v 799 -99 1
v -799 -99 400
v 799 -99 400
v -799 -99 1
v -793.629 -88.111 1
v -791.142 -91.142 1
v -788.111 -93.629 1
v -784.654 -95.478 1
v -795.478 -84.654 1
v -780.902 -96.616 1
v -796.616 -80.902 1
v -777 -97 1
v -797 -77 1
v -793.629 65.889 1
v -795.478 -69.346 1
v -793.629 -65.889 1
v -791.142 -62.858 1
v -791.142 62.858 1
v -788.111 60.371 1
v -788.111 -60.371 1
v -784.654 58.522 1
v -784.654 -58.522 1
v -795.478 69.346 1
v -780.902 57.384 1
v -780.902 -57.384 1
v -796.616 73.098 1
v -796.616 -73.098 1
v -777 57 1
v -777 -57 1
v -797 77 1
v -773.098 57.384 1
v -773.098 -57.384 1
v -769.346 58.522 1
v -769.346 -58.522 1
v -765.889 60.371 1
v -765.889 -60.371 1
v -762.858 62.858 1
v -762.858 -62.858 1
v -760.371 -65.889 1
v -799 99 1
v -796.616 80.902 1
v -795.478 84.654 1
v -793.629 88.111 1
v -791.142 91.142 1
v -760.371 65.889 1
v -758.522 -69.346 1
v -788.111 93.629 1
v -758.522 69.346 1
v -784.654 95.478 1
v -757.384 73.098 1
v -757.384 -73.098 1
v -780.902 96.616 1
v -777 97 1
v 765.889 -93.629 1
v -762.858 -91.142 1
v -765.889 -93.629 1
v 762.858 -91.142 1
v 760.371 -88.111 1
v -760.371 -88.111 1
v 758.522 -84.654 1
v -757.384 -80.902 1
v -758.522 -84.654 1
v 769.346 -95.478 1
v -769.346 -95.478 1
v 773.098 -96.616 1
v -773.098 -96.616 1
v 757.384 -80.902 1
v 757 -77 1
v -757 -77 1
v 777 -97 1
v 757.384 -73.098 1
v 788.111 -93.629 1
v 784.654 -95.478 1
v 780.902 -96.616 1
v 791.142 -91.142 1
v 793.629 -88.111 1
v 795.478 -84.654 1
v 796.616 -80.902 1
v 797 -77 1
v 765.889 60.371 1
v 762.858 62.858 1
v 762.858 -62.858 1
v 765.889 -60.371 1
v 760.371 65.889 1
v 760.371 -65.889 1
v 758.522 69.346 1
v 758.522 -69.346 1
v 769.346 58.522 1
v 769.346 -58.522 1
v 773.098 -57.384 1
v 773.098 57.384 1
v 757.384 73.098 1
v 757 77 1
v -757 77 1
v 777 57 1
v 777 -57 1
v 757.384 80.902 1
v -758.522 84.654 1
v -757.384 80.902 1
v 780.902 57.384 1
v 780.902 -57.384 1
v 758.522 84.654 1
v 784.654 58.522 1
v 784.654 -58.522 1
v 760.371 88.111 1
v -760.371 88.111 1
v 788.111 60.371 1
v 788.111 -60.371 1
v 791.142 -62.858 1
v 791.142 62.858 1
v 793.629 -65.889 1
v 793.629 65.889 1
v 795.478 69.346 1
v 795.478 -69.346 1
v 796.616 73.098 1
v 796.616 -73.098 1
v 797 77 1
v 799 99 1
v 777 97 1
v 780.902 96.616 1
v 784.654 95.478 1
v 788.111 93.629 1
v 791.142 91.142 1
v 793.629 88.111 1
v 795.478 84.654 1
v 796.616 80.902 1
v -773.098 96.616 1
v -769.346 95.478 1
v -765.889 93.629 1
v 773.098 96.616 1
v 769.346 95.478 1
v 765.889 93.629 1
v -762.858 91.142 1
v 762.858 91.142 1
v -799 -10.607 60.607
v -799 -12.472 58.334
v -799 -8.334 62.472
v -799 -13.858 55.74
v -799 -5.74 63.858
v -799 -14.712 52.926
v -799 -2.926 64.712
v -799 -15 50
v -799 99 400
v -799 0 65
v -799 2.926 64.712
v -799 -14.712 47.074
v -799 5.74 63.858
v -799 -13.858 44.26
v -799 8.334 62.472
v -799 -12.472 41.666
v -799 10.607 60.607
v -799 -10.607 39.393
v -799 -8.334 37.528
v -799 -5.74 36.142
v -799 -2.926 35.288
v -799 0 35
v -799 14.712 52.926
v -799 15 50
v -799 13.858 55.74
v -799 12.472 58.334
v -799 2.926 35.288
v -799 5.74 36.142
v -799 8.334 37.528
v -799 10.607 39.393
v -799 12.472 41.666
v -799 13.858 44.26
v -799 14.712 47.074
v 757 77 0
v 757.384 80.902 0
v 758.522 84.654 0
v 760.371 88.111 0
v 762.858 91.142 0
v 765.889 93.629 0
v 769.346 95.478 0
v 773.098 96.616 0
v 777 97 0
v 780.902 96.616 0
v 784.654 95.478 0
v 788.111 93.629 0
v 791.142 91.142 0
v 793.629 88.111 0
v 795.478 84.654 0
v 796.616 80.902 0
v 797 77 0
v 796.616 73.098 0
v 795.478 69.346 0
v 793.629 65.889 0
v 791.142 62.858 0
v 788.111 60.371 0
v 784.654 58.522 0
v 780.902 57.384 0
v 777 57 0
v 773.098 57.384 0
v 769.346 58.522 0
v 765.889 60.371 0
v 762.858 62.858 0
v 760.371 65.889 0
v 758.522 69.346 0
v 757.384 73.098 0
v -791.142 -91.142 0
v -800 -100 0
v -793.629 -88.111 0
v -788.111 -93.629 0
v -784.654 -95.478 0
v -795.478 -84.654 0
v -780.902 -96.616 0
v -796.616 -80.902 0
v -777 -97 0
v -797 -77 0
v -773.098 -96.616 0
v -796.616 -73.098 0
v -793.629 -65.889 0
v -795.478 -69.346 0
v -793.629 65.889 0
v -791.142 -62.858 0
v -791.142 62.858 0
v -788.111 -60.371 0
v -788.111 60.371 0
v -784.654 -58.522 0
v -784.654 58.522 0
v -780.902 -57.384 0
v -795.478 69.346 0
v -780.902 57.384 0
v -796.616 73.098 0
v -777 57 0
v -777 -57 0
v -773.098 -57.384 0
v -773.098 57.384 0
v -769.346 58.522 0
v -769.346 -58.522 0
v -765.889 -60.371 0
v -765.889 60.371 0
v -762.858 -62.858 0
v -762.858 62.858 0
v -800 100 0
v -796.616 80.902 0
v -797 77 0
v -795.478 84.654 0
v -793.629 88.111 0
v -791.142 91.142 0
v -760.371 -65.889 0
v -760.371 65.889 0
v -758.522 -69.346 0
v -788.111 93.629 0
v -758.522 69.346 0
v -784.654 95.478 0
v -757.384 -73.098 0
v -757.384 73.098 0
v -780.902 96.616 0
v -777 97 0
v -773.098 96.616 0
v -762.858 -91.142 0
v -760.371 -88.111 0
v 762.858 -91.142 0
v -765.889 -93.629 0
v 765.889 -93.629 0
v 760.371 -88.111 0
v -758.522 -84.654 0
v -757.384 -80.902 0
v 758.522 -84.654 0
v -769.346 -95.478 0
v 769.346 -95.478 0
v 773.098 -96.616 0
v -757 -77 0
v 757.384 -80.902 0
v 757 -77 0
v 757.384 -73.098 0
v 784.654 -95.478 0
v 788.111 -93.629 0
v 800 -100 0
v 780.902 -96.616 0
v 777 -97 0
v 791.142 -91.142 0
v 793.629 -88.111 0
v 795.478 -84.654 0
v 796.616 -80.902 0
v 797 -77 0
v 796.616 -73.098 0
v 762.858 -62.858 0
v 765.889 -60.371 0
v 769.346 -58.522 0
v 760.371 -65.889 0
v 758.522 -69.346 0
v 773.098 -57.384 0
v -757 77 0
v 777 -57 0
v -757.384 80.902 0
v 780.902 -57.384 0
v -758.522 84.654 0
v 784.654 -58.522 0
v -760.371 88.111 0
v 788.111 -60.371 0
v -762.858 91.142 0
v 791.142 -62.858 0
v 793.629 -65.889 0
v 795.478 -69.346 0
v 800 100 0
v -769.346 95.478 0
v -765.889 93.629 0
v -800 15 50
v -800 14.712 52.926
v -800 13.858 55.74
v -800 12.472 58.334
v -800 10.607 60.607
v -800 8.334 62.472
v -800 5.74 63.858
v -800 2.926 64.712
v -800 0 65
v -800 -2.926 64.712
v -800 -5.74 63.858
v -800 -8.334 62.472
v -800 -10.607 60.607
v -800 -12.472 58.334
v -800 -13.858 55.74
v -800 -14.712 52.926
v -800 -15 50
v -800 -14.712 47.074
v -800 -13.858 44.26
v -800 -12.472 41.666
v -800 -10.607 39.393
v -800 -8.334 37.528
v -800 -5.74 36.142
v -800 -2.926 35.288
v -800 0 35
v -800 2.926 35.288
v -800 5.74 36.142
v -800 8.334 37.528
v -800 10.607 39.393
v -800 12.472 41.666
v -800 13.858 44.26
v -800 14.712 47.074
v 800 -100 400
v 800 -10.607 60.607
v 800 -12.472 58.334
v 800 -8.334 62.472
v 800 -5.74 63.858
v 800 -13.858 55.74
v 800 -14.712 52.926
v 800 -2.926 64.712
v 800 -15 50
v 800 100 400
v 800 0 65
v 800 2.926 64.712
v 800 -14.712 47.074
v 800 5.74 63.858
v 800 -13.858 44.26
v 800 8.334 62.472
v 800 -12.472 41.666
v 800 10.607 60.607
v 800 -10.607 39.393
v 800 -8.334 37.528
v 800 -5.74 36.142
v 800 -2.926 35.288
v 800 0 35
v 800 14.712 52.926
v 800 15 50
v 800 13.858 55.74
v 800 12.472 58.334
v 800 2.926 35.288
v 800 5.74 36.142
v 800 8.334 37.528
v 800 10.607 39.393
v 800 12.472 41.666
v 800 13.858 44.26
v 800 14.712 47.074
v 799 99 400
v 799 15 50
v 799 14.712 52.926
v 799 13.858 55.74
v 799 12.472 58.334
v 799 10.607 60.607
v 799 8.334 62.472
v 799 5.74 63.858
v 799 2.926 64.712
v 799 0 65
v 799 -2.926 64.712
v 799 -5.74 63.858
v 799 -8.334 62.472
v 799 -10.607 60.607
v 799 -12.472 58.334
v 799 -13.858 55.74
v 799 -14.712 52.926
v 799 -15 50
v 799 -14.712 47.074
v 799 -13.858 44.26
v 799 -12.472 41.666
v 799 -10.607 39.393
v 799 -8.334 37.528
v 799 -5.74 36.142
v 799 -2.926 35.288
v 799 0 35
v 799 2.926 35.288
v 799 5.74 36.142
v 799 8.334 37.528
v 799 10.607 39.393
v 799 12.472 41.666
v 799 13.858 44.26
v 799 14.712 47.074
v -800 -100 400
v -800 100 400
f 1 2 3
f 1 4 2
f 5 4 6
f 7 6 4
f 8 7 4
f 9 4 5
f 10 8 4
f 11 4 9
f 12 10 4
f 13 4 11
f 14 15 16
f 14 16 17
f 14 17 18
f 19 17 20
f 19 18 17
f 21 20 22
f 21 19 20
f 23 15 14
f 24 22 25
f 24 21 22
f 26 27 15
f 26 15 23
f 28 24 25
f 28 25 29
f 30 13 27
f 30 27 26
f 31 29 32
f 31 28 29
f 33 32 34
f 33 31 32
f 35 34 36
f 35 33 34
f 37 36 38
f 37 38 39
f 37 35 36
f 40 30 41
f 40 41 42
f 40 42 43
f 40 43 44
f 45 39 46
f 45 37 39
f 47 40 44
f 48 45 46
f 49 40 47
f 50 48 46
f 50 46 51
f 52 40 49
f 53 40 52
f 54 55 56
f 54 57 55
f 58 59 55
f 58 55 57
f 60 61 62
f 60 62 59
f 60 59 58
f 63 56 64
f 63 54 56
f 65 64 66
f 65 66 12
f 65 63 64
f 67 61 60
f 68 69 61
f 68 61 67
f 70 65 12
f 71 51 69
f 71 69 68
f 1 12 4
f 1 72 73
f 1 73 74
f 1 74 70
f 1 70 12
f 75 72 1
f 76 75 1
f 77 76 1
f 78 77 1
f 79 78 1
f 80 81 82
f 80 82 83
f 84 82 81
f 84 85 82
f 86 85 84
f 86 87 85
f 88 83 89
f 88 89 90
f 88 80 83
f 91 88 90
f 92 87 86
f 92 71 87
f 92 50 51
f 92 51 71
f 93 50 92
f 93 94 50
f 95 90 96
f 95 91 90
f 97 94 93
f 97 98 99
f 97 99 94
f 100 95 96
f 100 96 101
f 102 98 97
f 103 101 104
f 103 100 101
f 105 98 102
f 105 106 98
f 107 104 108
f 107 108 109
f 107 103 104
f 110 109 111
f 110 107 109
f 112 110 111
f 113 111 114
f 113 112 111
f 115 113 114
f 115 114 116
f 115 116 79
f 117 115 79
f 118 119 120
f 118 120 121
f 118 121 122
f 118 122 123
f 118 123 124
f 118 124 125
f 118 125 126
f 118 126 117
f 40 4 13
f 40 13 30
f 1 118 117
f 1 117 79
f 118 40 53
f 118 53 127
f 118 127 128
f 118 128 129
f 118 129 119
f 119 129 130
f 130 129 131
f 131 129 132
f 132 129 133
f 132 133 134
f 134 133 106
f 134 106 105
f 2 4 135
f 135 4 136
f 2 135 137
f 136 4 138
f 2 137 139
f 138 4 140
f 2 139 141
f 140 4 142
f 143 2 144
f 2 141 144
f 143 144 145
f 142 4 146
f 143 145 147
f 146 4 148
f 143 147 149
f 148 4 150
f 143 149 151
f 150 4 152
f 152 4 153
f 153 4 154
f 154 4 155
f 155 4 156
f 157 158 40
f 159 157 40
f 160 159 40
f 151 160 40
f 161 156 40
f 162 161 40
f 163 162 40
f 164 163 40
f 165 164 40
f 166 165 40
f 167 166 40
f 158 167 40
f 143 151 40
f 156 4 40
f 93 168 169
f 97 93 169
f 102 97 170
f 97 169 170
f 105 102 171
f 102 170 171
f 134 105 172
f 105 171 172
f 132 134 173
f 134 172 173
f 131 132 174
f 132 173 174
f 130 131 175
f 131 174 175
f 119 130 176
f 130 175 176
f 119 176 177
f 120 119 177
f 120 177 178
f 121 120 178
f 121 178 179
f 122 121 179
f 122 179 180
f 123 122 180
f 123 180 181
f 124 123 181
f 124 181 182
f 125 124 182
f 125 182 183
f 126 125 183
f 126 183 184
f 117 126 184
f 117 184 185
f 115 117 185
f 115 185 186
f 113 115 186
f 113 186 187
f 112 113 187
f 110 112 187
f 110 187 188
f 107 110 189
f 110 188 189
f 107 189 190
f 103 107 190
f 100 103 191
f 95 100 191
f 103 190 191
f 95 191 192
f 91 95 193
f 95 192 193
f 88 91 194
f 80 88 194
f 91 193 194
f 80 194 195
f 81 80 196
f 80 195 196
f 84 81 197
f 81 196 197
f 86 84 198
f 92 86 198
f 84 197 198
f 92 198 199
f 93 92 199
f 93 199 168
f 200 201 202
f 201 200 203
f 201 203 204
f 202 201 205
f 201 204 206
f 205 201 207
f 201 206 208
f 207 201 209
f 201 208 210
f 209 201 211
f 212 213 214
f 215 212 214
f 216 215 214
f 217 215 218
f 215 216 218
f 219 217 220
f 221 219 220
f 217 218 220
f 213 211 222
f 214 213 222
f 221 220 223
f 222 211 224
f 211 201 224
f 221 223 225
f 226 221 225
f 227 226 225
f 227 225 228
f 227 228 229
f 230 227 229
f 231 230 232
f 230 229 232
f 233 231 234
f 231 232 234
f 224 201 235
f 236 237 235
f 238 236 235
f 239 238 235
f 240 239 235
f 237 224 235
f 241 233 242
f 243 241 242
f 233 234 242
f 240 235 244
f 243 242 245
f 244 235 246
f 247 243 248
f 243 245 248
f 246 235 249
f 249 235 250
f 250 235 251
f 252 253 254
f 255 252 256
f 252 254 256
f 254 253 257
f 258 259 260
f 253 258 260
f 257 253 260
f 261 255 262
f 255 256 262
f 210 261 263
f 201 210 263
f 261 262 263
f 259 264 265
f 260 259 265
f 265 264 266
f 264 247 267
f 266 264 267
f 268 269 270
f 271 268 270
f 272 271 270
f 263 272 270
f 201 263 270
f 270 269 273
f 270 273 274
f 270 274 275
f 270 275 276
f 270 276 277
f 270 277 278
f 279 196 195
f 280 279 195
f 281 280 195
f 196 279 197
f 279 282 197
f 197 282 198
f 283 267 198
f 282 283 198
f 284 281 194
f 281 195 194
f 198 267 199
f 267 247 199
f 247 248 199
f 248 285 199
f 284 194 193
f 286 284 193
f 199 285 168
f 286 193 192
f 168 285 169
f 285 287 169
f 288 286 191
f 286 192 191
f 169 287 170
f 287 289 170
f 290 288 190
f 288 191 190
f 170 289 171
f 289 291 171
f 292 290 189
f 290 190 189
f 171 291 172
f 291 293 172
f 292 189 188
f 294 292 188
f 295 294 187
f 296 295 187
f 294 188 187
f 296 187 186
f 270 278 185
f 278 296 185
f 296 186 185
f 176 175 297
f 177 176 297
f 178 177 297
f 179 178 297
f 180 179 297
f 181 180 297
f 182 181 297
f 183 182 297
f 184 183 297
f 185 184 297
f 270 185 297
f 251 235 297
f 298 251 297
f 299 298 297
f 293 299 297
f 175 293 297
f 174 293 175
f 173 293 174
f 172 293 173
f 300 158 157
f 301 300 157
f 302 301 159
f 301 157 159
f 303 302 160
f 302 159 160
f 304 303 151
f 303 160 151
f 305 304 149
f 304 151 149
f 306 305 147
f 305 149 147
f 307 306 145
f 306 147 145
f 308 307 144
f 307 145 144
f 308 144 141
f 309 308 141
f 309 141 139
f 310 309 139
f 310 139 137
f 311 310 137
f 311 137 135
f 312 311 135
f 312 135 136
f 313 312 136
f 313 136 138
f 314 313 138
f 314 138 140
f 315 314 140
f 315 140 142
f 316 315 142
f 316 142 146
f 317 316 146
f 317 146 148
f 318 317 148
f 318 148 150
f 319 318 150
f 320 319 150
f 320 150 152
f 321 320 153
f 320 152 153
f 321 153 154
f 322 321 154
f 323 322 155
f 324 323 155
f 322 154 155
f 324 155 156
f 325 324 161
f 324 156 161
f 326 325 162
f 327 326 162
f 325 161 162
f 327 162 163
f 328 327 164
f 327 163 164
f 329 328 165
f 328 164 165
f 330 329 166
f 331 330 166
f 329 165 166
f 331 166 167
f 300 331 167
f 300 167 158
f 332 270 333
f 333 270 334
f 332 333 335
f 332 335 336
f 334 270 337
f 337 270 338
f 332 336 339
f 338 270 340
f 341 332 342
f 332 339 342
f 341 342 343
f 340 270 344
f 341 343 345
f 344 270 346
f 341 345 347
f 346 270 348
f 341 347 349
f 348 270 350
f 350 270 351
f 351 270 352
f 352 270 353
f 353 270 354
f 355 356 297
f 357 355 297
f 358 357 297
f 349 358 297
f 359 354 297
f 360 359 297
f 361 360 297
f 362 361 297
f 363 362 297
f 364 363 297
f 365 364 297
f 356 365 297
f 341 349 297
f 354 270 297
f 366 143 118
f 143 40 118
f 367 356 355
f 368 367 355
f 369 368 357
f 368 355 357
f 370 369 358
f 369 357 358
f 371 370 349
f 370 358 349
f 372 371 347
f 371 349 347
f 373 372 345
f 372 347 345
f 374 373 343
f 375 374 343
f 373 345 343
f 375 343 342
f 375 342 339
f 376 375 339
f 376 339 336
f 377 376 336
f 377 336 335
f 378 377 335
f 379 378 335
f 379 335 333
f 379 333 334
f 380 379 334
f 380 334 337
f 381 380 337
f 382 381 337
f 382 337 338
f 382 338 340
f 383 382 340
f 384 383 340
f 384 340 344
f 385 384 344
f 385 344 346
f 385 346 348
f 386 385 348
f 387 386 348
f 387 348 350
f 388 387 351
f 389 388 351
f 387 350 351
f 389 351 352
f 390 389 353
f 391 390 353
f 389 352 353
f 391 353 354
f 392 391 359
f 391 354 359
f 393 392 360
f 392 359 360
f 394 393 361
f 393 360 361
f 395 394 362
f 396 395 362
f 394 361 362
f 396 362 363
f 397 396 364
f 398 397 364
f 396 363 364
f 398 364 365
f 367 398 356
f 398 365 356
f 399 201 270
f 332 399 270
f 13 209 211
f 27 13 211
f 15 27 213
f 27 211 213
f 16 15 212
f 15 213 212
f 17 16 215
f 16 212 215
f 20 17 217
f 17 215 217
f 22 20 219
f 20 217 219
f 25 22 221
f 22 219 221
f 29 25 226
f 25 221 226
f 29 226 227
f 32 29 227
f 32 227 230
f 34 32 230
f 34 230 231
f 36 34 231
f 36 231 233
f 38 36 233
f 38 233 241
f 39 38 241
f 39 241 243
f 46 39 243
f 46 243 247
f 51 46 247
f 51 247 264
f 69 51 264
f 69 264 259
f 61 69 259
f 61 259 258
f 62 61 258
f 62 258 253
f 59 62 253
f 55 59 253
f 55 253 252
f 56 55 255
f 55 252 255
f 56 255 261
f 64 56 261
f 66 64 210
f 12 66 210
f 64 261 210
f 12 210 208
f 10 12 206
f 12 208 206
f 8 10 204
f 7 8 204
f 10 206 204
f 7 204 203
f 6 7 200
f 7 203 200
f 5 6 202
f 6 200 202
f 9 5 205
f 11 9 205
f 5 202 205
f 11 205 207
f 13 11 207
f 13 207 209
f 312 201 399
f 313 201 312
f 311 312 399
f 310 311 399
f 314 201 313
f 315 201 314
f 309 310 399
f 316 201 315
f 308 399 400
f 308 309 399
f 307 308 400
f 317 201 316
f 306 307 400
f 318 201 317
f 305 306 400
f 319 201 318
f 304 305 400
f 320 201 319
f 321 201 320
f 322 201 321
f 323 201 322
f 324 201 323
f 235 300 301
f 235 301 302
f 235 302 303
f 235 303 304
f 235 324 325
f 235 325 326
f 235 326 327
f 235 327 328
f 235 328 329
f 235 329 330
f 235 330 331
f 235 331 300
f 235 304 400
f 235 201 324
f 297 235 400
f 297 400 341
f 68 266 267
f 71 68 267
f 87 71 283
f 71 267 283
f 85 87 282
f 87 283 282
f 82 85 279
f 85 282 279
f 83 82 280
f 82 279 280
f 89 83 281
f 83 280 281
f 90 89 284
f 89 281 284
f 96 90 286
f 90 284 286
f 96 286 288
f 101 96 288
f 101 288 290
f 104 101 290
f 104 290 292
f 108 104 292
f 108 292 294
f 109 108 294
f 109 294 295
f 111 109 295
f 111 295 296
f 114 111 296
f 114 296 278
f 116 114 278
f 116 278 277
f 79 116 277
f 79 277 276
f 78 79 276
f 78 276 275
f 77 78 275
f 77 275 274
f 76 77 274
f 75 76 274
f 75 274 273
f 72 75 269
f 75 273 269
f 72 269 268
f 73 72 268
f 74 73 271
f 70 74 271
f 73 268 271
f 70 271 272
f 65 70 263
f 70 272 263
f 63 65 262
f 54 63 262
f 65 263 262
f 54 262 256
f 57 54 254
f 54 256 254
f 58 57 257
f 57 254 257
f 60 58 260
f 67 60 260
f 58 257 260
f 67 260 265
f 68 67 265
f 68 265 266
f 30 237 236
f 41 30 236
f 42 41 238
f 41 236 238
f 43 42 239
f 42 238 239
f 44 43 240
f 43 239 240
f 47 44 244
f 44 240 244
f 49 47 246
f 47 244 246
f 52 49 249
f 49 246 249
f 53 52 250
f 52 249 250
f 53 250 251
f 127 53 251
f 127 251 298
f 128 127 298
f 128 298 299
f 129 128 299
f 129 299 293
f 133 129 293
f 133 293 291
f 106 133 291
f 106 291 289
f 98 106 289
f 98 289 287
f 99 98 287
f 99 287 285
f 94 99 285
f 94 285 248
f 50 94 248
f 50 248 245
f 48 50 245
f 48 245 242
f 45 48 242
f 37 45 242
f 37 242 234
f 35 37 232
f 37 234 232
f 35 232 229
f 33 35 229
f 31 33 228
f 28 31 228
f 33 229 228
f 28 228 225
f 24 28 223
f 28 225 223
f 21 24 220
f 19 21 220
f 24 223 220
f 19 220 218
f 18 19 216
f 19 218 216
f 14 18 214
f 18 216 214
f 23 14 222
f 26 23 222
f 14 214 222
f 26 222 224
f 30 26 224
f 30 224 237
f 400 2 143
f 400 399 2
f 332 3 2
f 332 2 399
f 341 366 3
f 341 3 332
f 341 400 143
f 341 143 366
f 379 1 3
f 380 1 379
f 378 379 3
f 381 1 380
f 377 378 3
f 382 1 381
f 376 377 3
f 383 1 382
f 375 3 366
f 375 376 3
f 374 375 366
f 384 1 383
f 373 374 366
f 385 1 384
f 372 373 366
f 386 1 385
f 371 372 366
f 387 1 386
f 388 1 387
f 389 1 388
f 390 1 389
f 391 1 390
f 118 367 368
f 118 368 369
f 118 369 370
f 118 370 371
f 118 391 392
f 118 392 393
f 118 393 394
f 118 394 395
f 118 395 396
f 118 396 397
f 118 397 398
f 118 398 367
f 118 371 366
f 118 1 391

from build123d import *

# Parameters (mm, degrees)
F0_W     = 1600
F0_H     = 200
F1_DEPTH = 400
F2_T     = -1
F5_D     = 40
F8_D     = 30


# Not quite as in the source:
# - the program builds the solid bodies; features that only make, move or delete a surface that nothing else refers to are left out


with BuildPart() as f1:
    # F0 (on Top) → F1 (new body)
    with BuildSketch(Plane.XY):
        Rectangle(F0_W, F0_H)
    extrude(amount=F1_DEPTH)

    # F2
    f2_openings = [f1.faces().sort_by_distance(p)[0] for p in [
        (0, 0, 400),
    ]]
    offset(amount=F2_T, openings=f2_openings)

    # F5 (through all)
    with Locations(Plane.XY.offset(1)):
        with Locations((777, 77), (777, -77), (-777, 77), (-777, -77)):
            Hole(F5_D / 2)

    # F8 (through all)
    with Locations(Plane(origin=(-800, 0, 0), x_dir=(0, -1, 0), z_dir=(-1, 0, 0))):
        with Locations((0, 50)):
            Hole(F8_D / 2)


solid = f1.part
